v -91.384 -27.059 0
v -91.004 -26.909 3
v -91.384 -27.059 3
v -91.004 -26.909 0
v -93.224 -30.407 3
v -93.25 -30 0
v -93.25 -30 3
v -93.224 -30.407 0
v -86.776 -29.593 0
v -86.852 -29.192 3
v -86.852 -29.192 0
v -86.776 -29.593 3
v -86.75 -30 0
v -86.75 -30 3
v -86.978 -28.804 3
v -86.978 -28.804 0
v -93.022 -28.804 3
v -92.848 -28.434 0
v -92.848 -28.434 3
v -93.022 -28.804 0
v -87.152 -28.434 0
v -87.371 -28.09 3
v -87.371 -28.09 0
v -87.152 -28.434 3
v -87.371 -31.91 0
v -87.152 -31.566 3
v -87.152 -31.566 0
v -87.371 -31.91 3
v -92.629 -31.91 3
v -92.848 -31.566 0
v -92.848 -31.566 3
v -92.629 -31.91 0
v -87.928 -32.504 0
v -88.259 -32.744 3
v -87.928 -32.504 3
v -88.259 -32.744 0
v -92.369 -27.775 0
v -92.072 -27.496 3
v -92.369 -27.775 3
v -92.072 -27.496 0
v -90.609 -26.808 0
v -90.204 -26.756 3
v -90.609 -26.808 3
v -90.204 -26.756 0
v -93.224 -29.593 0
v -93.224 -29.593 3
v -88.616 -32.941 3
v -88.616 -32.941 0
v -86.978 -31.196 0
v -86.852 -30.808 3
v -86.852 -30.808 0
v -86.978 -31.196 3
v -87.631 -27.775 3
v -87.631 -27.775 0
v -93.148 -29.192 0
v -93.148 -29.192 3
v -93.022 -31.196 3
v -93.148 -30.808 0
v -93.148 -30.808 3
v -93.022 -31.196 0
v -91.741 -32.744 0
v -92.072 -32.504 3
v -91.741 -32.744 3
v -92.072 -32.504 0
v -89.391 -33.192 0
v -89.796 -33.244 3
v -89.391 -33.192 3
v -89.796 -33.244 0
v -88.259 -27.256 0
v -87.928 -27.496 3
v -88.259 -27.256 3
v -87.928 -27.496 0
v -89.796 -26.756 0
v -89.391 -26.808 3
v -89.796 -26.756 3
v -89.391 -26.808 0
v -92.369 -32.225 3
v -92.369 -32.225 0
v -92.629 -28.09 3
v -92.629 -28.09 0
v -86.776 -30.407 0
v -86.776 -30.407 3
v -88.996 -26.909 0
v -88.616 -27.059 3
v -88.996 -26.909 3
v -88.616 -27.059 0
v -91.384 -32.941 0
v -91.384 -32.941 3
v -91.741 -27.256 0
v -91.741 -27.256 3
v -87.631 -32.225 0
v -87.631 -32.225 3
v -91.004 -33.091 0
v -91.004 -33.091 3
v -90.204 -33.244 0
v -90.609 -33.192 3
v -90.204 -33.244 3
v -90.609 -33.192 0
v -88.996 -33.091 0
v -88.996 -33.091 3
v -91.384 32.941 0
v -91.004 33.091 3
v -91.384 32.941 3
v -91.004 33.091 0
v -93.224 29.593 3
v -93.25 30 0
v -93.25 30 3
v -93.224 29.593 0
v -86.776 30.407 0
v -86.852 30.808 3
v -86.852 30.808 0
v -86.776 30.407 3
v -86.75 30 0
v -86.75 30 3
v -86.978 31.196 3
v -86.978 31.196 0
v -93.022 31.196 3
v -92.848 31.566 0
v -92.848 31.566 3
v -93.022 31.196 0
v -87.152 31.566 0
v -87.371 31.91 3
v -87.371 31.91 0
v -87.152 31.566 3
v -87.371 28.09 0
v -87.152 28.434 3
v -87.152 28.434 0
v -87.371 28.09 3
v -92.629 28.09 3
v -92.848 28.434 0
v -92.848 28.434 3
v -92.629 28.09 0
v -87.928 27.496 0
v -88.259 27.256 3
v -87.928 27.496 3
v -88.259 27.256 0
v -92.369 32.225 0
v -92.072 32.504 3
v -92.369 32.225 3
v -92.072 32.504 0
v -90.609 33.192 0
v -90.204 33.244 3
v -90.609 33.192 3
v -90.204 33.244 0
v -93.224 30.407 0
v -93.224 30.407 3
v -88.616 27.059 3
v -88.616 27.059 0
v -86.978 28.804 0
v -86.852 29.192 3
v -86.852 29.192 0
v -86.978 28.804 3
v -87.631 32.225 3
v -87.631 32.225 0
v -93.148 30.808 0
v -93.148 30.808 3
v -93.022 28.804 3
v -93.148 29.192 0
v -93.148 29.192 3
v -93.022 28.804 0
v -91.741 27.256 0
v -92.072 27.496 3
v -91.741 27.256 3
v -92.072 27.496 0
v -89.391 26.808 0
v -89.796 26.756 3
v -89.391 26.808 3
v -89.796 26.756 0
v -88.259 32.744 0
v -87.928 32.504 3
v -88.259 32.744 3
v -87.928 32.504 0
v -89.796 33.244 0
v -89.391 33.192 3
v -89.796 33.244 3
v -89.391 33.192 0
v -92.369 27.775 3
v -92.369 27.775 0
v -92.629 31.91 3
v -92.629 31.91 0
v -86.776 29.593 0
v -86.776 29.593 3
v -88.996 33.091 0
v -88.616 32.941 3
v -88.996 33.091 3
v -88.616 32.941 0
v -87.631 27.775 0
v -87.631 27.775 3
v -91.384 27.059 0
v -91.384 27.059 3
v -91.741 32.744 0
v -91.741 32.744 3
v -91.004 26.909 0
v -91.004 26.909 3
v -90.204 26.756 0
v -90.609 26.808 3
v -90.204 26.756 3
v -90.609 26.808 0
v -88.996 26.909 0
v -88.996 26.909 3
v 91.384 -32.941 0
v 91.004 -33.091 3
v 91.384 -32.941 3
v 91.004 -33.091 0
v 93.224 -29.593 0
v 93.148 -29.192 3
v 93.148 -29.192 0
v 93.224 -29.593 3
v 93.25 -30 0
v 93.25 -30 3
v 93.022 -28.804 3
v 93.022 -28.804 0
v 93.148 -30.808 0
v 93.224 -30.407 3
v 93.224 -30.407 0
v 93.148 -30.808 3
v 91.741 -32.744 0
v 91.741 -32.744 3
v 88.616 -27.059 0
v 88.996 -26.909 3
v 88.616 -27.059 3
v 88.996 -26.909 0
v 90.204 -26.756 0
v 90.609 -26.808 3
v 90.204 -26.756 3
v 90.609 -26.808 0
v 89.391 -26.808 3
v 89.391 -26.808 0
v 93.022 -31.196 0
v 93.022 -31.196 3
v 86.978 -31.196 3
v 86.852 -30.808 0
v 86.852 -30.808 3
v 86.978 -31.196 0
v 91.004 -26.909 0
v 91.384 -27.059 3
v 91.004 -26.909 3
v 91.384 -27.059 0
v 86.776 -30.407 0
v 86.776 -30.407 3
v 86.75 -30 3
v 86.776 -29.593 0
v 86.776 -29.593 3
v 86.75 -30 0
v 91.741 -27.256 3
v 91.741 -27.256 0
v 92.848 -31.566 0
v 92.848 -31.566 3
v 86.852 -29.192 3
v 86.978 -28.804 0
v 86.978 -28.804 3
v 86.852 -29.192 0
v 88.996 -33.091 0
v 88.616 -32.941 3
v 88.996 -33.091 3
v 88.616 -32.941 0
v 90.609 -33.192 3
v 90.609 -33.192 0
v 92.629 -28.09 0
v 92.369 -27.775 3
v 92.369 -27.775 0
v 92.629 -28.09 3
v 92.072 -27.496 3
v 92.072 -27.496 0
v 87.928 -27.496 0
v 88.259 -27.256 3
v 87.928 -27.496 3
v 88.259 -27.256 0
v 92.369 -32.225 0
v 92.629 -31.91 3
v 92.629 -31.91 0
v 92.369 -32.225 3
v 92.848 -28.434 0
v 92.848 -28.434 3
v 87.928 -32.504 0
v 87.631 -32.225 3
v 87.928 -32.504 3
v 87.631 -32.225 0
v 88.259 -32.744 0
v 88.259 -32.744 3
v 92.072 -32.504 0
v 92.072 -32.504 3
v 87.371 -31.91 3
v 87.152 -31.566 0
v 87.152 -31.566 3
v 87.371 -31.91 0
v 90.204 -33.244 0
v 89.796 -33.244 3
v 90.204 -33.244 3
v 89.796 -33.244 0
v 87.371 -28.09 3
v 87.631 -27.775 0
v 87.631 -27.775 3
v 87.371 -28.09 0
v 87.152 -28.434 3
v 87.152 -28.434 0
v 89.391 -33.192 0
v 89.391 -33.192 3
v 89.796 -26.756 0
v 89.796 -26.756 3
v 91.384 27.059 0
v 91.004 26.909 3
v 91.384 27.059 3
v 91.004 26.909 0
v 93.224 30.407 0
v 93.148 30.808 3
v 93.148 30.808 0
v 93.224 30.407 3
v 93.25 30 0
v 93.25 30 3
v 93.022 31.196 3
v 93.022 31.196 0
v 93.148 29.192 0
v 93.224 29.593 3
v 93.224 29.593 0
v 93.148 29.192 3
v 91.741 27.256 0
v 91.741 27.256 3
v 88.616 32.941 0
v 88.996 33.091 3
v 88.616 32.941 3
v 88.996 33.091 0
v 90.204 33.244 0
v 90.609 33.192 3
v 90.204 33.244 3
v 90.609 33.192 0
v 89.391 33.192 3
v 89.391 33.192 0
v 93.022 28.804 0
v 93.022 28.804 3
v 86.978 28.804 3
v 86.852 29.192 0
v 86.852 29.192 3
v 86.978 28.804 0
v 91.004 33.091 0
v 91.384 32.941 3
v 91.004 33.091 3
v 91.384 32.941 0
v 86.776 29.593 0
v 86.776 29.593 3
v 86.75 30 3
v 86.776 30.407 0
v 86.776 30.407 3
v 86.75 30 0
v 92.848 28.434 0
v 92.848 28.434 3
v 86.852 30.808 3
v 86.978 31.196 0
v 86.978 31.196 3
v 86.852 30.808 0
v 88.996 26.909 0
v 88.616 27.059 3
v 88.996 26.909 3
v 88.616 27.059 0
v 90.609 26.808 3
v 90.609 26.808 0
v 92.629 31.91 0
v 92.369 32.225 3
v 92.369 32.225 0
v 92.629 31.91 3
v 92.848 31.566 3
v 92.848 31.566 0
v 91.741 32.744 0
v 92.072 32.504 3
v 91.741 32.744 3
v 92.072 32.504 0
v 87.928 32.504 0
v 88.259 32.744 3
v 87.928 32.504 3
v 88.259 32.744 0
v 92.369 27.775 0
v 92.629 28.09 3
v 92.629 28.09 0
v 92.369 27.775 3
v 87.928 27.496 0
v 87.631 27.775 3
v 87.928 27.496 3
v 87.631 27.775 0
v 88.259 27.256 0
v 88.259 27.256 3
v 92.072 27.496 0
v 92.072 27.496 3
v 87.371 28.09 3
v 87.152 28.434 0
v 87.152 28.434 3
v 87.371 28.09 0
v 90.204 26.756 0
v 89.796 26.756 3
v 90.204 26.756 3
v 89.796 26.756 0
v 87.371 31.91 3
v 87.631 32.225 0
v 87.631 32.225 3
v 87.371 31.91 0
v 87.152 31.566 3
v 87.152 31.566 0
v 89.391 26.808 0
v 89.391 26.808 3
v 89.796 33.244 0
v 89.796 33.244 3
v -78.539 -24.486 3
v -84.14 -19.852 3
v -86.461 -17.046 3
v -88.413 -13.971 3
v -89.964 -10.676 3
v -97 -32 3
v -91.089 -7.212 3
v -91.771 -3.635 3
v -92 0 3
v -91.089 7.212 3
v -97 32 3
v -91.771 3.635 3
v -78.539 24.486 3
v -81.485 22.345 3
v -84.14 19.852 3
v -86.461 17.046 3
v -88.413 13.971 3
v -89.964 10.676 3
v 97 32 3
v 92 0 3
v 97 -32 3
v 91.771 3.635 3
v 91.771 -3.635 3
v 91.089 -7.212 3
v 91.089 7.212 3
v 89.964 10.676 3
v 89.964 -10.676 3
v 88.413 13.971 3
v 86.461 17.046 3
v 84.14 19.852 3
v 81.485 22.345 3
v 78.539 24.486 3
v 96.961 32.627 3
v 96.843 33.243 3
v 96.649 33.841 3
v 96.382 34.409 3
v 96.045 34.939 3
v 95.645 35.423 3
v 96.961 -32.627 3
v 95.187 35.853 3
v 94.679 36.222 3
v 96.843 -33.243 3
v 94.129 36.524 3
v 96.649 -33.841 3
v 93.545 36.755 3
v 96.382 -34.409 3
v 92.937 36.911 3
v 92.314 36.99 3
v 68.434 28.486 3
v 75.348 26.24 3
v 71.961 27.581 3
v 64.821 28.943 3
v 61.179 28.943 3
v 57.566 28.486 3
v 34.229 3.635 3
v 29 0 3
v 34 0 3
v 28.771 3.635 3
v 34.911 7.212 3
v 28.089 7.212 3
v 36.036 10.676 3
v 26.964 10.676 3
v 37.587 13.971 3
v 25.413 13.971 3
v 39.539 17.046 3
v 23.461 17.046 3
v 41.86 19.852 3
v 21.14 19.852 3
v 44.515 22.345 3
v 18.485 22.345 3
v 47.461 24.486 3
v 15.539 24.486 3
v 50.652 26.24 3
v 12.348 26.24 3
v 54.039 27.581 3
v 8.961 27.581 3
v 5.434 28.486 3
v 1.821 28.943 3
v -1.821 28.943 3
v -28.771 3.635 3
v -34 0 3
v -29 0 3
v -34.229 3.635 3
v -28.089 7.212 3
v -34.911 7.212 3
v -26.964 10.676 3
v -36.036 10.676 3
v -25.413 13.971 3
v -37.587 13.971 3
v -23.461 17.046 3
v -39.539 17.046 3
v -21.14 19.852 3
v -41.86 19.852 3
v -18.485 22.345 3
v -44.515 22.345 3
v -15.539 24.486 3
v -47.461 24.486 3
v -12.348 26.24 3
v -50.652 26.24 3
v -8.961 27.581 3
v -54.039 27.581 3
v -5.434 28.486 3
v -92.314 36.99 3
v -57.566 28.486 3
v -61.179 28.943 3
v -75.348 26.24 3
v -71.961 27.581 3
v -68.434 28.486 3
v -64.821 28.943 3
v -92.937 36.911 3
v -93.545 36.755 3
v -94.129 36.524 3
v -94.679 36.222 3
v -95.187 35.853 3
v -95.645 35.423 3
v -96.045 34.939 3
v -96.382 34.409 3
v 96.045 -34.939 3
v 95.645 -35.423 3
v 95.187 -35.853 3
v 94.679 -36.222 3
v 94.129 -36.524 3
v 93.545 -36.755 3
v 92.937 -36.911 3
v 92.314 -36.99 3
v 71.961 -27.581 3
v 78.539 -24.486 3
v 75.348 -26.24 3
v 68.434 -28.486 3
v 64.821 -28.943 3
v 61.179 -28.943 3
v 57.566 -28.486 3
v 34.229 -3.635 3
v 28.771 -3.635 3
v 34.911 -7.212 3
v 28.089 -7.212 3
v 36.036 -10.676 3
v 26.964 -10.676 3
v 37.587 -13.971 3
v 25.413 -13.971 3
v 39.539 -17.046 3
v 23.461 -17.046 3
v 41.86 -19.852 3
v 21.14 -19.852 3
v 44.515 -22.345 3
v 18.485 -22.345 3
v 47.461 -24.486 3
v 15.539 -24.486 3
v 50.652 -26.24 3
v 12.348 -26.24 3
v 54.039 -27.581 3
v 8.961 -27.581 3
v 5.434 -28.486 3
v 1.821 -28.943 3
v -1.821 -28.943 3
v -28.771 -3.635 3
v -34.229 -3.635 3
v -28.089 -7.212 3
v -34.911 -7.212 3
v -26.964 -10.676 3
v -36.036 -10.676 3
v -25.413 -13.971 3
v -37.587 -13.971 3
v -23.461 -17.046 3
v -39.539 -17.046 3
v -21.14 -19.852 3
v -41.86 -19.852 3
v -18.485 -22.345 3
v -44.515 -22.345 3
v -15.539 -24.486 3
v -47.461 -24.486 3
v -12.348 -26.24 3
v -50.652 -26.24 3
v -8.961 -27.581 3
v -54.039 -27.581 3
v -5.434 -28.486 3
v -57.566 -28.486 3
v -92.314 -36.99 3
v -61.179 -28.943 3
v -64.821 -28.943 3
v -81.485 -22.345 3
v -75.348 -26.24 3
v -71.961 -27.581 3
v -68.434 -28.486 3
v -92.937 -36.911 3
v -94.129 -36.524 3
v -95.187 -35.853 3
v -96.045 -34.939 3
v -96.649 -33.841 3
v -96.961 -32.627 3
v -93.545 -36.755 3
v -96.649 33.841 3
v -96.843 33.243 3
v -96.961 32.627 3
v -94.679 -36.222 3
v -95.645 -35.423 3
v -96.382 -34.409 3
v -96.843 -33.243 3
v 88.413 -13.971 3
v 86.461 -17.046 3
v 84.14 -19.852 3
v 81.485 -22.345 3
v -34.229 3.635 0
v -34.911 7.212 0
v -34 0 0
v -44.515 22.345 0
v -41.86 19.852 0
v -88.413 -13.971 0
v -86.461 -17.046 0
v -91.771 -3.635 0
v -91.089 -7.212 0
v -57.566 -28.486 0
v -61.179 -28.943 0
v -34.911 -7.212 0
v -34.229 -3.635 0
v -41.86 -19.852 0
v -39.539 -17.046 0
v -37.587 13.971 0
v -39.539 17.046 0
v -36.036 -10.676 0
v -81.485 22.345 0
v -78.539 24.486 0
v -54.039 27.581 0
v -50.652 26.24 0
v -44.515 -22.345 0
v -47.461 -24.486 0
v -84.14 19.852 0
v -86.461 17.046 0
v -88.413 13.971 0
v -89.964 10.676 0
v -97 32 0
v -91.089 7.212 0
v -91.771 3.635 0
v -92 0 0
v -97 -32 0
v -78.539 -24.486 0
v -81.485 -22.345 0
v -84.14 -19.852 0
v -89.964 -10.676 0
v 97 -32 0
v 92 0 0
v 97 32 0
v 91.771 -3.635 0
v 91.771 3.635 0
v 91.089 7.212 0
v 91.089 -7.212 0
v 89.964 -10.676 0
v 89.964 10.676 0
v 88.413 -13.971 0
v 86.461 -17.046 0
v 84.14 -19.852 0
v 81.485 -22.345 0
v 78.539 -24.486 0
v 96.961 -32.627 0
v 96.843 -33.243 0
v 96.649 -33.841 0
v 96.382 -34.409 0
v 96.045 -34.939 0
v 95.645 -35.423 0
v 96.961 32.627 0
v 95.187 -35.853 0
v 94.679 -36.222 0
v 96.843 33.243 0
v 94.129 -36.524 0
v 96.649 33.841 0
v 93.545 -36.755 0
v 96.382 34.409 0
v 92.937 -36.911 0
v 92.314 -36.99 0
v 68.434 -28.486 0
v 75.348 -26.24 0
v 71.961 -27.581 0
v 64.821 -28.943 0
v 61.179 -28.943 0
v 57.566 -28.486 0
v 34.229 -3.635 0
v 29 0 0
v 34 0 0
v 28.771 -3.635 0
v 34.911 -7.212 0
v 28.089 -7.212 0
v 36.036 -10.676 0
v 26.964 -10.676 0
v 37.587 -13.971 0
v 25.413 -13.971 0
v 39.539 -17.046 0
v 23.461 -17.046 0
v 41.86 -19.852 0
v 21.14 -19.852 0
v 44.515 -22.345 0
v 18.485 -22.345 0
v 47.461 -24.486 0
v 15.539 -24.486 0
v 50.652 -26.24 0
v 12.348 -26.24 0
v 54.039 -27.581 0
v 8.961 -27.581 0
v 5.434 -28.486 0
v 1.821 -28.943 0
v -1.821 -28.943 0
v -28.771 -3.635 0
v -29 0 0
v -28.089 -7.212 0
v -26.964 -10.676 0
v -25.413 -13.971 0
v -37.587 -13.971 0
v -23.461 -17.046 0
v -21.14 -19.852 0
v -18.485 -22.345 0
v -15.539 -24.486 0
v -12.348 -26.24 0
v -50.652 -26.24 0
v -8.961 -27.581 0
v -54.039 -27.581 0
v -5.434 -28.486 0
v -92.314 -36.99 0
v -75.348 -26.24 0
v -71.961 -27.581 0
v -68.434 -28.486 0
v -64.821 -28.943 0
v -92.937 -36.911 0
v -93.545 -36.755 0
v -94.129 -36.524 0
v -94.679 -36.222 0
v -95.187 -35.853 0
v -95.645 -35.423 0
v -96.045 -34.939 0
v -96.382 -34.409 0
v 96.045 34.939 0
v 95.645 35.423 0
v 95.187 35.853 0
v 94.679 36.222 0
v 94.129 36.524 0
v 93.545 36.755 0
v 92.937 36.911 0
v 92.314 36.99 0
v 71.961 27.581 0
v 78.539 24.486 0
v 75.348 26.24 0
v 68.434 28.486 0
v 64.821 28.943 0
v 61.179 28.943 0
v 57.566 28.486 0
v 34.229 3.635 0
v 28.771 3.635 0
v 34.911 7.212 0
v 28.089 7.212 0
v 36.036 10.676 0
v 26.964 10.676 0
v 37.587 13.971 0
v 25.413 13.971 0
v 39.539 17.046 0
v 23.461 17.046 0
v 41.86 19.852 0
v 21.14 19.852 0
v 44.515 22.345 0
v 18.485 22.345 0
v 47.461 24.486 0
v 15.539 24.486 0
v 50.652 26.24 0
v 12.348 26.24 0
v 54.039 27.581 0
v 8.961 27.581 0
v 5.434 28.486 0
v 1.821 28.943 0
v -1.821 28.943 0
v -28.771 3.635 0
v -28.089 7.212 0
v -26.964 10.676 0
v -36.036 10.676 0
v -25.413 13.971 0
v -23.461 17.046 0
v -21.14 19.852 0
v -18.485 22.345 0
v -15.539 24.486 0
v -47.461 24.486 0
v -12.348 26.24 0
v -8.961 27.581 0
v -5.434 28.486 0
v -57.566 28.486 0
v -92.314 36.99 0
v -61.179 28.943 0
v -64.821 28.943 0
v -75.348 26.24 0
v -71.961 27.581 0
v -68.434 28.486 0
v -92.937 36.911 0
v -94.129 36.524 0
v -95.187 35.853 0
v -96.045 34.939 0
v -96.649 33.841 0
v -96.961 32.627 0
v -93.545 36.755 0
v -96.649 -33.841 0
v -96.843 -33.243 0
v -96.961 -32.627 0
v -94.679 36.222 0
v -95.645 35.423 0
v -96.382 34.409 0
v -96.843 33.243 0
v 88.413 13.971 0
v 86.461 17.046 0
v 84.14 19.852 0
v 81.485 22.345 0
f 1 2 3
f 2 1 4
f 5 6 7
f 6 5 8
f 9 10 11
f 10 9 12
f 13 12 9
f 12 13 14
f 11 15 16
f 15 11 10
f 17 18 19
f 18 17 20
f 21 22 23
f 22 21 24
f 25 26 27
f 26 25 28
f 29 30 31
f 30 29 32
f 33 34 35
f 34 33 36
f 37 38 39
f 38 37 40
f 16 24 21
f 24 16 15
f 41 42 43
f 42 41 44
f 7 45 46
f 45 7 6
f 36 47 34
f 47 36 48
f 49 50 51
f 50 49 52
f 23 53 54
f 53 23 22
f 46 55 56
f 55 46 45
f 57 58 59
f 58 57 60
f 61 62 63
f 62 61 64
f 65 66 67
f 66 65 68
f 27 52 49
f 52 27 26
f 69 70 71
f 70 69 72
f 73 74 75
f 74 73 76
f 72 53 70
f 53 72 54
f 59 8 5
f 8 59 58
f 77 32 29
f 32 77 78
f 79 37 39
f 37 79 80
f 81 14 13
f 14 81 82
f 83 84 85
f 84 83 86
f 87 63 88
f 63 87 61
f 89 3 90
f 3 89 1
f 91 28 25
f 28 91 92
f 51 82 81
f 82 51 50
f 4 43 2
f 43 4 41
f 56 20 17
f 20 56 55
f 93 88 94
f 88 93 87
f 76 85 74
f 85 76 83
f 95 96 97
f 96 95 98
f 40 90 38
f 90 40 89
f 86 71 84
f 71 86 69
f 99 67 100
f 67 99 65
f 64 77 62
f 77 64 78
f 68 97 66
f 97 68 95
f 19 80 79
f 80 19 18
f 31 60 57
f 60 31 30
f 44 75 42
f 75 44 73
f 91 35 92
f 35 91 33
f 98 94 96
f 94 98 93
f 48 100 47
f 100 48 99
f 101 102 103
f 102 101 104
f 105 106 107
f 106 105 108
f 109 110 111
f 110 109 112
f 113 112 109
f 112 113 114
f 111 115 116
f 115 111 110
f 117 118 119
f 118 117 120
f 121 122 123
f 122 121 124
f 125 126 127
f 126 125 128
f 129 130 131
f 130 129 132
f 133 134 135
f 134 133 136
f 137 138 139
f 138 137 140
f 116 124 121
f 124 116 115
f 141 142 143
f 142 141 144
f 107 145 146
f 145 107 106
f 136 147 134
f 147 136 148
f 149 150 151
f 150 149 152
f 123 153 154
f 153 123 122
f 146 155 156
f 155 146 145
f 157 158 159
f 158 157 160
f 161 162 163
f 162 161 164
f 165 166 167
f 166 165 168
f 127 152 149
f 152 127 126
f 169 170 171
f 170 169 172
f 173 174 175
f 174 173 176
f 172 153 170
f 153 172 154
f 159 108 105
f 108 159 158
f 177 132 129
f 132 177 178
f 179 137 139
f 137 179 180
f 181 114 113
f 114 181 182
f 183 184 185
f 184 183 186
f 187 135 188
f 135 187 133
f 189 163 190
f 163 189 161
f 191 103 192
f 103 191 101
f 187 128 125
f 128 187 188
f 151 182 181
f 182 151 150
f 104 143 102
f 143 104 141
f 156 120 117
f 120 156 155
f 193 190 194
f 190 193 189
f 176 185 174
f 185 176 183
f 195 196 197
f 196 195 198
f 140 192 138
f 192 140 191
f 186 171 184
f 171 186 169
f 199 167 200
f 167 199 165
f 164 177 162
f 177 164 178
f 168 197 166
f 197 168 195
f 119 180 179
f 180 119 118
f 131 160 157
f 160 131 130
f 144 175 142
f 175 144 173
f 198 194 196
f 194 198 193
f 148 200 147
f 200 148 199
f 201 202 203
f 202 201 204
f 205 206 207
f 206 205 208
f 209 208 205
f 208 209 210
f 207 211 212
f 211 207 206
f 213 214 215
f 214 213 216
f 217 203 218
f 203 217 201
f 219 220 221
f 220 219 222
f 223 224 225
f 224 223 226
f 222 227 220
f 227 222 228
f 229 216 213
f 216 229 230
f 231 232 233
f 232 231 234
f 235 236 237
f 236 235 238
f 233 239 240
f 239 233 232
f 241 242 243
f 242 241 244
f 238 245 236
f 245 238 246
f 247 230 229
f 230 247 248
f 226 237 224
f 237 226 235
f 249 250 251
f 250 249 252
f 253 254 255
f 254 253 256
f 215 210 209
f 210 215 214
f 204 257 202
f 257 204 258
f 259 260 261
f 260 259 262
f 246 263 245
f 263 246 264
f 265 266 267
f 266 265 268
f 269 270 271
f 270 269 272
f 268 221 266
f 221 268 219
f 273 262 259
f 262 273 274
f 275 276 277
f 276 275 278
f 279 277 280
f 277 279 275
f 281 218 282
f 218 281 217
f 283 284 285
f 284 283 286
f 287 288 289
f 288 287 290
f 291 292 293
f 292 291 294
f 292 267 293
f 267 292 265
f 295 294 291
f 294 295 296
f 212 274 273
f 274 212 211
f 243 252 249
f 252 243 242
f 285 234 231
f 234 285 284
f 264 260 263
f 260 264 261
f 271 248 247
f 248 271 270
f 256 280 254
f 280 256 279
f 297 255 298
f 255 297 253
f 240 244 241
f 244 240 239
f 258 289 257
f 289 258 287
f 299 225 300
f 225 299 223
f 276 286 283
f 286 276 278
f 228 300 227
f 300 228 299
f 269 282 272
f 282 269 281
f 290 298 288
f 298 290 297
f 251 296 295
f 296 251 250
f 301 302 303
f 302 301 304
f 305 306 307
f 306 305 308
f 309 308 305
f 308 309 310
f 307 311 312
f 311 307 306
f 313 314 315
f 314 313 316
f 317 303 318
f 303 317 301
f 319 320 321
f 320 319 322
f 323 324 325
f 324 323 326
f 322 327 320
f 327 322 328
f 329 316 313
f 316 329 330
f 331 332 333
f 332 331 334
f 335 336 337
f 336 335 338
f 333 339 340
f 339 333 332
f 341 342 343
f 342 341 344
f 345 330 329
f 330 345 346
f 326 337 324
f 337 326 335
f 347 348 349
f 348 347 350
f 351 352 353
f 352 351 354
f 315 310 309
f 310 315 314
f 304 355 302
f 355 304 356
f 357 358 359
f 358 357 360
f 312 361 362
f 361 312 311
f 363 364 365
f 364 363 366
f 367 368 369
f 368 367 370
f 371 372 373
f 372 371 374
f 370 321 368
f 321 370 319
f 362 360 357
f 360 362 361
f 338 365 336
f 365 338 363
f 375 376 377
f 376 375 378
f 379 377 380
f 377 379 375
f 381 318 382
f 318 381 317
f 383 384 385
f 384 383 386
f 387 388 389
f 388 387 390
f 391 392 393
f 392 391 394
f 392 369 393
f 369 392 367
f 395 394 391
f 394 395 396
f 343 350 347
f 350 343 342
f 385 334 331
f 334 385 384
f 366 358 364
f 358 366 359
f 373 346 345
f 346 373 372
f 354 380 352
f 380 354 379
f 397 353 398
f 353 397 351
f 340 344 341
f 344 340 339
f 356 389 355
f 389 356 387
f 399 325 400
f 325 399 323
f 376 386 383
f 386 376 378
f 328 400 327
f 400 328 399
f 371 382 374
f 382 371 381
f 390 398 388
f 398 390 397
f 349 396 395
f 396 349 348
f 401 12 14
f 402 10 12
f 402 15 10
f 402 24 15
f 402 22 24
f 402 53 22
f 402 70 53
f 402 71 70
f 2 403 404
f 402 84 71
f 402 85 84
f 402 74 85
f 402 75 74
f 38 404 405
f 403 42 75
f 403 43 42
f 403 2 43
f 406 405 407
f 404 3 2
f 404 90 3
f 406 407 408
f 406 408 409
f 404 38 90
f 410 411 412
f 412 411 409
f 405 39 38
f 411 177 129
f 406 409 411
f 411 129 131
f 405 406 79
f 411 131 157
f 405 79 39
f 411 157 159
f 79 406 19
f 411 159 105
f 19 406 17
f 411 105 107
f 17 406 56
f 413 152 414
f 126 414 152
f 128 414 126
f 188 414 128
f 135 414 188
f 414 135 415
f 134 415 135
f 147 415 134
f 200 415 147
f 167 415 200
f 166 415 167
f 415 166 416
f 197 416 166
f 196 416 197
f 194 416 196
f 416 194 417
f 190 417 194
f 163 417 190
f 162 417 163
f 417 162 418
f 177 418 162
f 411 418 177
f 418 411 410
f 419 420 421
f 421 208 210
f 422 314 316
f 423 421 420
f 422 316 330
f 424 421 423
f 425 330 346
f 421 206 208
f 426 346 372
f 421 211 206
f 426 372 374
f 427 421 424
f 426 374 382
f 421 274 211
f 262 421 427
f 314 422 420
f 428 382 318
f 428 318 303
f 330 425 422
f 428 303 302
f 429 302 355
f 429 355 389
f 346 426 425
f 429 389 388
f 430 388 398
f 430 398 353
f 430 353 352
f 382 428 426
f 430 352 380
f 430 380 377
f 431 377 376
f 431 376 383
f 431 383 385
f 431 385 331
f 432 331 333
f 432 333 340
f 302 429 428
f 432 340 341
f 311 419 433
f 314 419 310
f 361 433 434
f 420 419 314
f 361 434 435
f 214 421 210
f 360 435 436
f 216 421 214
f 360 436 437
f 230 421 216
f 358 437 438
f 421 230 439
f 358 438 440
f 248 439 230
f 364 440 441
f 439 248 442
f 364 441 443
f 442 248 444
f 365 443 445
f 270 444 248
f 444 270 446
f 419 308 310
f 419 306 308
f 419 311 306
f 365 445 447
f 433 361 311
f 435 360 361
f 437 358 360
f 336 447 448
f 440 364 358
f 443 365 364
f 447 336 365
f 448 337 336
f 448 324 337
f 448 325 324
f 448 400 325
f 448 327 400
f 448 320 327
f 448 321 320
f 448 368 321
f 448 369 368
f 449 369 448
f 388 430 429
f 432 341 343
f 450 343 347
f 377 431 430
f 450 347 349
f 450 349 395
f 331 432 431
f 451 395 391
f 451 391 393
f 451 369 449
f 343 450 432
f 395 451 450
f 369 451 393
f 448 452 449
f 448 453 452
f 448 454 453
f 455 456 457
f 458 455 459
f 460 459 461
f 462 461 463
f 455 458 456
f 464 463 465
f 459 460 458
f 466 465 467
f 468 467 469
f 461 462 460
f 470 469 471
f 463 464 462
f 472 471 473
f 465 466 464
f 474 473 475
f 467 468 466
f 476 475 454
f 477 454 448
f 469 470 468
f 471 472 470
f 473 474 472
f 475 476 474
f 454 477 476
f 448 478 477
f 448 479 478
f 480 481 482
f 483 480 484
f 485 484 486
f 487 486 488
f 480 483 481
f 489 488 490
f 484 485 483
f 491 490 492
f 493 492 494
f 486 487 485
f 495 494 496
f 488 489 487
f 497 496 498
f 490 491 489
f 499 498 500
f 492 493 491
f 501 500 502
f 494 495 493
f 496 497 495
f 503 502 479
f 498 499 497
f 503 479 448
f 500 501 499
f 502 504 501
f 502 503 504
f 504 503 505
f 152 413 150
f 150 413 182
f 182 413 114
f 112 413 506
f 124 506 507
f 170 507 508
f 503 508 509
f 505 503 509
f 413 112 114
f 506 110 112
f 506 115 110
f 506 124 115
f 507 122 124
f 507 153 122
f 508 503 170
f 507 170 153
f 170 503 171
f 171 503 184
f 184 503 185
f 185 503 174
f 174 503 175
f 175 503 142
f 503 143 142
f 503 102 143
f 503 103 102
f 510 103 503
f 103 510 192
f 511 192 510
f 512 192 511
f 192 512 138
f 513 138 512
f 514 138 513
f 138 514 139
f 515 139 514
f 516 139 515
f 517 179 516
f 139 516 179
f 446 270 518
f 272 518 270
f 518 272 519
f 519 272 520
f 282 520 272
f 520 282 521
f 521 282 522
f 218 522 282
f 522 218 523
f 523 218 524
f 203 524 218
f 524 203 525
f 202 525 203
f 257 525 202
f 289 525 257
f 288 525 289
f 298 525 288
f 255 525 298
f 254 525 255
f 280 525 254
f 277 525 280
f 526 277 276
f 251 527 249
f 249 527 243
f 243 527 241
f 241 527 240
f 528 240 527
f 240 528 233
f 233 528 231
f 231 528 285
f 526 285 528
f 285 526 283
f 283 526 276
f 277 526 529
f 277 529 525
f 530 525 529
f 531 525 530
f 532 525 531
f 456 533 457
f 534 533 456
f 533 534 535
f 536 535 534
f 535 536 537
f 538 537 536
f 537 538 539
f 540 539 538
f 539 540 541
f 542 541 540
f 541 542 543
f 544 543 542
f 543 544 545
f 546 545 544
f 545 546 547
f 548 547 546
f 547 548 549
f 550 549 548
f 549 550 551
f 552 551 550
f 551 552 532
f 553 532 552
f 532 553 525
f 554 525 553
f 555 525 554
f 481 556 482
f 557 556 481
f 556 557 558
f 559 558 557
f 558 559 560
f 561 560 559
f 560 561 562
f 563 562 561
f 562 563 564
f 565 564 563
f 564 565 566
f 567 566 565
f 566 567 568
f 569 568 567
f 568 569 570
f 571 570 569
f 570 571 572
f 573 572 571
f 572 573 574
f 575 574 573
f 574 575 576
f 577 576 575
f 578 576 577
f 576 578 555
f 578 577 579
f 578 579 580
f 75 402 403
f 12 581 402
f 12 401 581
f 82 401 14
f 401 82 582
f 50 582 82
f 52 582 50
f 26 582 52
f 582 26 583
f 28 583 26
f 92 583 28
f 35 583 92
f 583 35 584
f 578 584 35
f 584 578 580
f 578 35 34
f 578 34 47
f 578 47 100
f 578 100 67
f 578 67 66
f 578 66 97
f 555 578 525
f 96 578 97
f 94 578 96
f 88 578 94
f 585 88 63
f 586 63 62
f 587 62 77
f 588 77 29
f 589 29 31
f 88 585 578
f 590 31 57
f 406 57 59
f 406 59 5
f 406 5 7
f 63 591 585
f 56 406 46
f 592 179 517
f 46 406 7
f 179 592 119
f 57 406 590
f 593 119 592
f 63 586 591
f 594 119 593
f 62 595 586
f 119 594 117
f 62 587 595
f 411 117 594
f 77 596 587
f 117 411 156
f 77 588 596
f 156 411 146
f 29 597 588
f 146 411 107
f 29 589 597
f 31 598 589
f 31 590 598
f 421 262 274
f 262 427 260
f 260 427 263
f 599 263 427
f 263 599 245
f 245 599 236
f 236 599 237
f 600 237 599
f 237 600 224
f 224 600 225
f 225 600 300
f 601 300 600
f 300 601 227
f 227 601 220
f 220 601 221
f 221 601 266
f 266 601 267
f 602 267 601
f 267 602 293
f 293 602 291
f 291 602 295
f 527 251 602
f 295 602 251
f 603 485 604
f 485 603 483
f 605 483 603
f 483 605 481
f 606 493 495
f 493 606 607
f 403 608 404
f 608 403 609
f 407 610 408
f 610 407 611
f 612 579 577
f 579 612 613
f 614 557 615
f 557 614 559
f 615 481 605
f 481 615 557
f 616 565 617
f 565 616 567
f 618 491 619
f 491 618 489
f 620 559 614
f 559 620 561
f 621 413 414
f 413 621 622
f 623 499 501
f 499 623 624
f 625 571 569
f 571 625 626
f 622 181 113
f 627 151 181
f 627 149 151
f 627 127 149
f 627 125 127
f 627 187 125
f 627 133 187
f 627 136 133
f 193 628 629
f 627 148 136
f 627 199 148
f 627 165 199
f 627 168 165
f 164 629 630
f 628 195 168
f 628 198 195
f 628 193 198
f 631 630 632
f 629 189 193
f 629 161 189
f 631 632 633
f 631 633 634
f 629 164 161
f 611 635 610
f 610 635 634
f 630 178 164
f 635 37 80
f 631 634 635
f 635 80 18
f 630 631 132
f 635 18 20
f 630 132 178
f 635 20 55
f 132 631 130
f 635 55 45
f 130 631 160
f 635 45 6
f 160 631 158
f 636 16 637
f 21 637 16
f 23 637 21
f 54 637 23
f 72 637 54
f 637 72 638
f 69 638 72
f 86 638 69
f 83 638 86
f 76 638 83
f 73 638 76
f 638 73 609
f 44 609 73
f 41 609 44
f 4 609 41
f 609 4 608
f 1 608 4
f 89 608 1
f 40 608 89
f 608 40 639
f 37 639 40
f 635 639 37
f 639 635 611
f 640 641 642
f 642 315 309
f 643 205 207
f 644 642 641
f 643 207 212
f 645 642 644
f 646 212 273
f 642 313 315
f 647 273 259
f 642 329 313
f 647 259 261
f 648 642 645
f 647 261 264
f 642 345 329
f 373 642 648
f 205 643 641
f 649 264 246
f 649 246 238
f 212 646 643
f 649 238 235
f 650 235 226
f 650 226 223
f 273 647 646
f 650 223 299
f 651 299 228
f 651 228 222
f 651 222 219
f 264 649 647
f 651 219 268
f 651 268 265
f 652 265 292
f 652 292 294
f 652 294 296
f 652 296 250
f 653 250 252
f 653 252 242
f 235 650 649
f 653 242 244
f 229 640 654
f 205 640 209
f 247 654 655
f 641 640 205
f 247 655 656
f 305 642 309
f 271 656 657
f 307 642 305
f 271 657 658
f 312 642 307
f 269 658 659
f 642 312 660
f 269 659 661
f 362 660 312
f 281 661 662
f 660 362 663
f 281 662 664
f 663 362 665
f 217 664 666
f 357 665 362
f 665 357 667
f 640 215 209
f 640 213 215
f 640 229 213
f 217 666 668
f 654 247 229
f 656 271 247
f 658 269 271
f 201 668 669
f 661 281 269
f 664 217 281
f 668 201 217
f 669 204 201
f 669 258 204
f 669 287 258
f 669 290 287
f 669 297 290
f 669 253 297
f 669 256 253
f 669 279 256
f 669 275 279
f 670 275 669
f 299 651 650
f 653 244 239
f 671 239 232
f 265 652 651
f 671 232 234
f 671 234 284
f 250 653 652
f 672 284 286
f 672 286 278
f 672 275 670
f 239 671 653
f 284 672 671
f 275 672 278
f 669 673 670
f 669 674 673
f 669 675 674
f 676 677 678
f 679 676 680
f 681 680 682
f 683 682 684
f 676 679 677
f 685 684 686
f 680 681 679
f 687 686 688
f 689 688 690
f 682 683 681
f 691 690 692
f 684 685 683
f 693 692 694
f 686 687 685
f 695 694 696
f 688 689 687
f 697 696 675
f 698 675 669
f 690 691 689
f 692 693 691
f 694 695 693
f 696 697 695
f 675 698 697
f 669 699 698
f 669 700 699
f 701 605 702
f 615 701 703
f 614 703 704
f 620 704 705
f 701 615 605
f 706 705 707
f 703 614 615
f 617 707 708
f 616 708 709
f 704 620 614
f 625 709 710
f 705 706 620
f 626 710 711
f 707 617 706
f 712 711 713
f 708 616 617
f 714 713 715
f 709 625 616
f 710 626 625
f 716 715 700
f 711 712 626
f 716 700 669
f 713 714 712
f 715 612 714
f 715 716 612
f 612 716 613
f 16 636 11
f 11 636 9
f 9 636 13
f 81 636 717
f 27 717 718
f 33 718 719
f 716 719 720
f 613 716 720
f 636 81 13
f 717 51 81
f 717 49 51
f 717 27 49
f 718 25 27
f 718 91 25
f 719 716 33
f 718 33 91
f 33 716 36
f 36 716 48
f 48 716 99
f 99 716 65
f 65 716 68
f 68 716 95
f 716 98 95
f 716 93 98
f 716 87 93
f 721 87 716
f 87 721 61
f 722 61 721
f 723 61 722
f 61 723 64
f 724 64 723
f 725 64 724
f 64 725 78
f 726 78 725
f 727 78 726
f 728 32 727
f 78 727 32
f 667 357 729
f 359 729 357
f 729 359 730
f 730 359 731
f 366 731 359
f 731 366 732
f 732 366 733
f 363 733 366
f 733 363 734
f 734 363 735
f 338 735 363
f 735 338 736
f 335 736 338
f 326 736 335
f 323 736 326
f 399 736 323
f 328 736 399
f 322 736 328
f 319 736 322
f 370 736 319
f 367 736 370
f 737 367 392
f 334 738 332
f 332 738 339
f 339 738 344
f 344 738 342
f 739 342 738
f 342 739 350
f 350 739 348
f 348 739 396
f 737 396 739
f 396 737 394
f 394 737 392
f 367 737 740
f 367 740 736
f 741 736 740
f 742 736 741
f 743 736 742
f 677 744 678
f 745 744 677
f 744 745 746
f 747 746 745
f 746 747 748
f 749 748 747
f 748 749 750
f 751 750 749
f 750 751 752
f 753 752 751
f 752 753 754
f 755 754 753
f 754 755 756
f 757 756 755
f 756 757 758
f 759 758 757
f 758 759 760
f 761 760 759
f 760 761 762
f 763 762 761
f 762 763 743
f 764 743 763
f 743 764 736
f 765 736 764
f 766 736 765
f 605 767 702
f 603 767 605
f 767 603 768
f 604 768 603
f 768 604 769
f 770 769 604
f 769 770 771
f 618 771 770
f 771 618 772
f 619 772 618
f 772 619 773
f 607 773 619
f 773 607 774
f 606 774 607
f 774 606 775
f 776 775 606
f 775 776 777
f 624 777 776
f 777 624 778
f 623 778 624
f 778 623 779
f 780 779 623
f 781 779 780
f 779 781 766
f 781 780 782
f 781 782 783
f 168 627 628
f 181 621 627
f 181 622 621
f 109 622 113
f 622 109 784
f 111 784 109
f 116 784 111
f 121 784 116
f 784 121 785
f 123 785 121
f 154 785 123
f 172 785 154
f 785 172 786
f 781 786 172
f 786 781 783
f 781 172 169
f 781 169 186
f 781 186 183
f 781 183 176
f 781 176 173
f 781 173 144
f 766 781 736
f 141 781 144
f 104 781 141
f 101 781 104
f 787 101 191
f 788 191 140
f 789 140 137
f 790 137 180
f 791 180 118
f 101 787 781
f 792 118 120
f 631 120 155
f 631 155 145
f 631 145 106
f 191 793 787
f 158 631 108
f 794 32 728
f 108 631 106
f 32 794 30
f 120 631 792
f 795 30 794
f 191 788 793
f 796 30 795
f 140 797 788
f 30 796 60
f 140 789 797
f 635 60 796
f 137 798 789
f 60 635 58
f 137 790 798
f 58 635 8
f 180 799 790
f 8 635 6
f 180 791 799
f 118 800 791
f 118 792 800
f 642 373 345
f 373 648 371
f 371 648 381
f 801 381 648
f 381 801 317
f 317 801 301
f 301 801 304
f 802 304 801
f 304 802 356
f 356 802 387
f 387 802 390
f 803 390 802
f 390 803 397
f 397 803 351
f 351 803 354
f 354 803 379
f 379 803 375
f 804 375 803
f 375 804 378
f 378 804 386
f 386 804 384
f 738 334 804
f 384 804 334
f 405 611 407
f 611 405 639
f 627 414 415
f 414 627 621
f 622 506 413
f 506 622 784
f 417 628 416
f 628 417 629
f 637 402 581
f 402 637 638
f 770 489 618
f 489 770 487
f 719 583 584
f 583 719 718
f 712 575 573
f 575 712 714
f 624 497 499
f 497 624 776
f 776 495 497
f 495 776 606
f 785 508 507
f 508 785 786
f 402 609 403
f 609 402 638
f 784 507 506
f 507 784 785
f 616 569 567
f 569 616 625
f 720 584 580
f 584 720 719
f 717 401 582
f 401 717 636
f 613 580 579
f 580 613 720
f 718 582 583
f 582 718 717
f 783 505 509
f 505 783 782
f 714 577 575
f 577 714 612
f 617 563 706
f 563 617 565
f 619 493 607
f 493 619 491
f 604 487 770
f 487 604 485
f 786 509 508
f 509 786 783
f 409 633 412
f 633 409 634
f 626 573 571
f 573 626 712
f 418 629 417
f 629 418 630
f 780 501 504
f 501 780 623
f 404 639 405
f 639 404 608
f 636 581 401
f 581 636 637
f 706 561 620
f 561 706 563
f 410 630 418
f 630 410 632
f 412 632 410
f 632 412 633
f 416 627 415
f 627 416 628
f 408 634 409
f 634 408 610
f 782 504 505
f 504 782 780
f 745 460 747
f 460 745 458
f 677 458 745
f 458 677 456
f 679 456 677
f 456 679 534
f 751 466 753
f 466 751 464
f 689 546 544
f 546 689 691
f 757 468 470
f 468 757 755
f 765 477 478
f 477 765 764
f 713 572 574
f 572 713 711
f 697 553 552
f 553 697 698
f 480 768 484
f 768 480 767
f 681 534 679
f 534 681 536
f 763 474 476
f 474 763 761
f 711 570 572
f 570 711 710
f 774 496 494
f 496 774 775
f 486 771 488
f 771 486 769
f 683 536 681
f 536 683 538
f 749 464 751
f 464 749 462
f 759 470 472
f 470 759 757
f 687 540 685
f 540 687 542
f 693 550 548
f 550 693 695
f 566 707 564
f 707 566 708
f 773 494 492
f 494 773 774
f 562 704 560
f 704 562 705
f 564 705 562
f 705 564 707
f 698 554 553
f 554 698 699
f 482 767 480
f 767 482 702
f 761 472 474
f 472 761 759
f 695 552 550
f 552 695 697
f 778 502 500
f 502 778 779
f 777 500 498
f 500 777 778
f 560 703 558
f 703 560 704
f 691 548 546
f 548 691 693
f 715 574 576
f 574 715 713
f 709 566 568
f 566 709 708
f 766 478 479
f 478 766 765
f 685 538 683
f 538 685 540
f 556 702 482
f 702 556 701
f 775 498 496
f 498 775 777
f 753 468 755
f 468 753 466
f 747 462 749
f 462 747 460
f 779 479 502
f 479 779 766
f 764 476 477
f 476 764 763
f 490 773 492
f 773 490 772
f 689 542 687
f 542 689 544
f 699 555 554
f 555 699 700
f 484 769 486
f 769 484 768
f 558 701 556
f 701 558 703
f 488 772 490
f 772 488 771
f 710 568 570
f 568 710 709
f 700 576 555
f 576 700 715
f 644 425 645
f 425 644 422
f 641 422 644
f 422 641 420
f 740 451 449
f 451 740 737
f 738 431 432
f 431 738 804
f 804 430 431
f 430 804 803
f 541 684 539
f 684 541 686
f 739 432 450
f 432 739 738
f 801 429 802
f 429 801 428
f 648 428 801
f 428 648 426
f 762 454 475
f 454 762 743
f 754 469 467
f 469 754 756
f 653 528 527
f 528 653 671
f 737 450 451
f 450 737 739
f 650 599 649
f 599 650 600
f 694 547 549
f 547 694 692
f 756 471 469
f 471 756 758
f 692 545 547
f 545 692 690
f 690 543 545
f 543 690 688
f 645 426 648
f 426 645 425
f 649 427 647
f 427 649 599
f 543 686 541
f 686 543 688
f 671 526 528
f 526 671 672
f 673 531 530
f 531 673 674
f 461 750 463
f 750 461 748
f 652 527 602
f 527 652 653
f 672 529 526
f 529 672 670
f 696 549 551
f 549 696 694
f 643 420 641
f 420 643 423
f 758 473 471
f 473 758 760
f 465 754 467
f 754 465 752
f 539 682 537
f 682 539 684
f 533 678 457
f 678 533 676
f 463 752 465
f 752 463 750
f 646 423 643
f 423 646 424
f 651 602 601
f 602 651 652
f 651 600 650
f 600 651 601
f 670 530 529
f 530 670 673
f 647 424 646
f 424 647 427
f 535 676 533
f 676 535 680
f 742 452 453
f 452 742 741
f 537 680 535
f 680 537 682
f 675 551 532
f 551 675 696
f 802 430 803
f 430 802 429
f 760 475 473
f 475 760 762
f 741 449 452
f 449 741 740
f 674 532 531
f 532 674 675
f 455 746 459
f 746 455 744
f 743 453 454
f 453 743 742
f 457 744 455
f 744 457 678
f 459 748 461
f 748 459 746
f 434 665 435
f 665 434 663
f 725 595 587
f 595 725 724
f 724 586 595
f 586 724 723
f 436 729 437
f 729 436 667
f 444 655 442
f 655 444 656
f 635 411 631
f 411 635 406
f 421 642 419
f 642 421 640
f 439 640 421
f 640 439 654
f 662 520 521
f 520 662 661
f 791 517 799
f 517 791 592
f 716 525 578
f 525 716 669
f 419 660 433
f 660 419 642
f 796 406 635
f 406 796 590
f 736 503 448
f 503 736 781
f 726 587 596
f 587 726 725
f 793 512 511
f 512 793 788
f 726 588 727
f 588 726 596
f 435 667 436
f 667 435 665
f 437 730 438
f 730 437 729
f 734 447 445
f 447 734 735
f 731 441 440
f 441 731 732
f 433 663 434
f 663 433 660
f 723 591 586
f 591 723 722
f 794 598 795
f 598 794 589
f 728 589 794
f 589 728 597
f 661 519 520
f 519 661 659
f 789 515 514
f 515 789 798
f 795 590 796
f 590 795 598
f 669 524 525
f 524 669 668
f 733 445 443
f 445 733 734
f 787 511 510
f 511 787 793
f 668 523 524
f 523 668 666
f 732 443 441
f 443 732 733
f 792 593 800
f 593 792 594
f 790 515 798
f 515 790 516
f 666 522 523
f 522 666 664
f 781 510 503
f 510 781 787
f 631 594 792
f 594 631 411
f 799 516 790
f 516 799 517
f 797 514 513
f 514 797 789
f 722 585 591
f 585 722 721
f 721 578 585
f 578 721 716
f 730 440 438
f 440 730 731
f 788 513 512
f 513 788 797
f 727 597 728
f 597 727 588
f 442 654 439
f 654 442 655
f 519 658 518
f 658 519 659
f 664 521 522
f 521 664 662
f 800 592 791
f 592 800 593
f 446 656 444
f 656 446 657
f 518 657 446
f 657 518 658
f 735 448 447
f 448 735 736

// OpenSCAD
$fn = 50;

difference() {
	union() {
		hull() {
			translate(v = [-92.0, 32.0, 0]) {
				cylinder(h = 3, r = 5);
			}
			translate(v = [92.0, 32.0, 0]) {
				cylinder(h = 3, r = 5);
			}
			translate(v = [-92.0, -32.0, 0]) {
				cylinder(h = 3, r = 5);
			}
			translate(v = [92.0, -32.0, 0]) {
				cylinder(h = 3, r = 5);
			}
		}
	}
	union() {
		translate(v = [-90.0, -30.0, -100.0]) {
			cylinder(h = 200, r = 3.25);
		}
		translate(v = [-90.0, 30.0, -100.0]) {
			cylinder(h = 200, r = 3.25);
		}
		translate(v = [90.0, -30.0, -100.0]) {
			cylinder(h = 200, r = 3.25);
		}
		translate(v = [90.0, 30.0, -100.0]) {
			cylinder(h = 200, r = 3.25);
		}
		translate(v = [-90.0, -30.0, -100.0]) {
			cylinder(h = 200, r = 1.8);
		}
		translate(v = [-90.0, 30.0, -100.0]) {
			cylinder(h = 200, r = 1.8);
		}
		translate(v = [90.0, -30.0, -100.0]) {
			cylinder(h = 200, r = 1.8);
		}
		translate(v = [90.0, 30.0, -100.0]) {
			cylinder(h = 200, r = 1.8);
		}
		translate(v = [-63.0, 0, 0.0]) {
			cylinder(h = 3, r = 29.0);
		}
		cylinder(h = 3, r = 29.0);
		translate(v = [63.0, 0, 0.0]) {
			cylinder(h = 3, r = 29.0);
		}
	}
}
